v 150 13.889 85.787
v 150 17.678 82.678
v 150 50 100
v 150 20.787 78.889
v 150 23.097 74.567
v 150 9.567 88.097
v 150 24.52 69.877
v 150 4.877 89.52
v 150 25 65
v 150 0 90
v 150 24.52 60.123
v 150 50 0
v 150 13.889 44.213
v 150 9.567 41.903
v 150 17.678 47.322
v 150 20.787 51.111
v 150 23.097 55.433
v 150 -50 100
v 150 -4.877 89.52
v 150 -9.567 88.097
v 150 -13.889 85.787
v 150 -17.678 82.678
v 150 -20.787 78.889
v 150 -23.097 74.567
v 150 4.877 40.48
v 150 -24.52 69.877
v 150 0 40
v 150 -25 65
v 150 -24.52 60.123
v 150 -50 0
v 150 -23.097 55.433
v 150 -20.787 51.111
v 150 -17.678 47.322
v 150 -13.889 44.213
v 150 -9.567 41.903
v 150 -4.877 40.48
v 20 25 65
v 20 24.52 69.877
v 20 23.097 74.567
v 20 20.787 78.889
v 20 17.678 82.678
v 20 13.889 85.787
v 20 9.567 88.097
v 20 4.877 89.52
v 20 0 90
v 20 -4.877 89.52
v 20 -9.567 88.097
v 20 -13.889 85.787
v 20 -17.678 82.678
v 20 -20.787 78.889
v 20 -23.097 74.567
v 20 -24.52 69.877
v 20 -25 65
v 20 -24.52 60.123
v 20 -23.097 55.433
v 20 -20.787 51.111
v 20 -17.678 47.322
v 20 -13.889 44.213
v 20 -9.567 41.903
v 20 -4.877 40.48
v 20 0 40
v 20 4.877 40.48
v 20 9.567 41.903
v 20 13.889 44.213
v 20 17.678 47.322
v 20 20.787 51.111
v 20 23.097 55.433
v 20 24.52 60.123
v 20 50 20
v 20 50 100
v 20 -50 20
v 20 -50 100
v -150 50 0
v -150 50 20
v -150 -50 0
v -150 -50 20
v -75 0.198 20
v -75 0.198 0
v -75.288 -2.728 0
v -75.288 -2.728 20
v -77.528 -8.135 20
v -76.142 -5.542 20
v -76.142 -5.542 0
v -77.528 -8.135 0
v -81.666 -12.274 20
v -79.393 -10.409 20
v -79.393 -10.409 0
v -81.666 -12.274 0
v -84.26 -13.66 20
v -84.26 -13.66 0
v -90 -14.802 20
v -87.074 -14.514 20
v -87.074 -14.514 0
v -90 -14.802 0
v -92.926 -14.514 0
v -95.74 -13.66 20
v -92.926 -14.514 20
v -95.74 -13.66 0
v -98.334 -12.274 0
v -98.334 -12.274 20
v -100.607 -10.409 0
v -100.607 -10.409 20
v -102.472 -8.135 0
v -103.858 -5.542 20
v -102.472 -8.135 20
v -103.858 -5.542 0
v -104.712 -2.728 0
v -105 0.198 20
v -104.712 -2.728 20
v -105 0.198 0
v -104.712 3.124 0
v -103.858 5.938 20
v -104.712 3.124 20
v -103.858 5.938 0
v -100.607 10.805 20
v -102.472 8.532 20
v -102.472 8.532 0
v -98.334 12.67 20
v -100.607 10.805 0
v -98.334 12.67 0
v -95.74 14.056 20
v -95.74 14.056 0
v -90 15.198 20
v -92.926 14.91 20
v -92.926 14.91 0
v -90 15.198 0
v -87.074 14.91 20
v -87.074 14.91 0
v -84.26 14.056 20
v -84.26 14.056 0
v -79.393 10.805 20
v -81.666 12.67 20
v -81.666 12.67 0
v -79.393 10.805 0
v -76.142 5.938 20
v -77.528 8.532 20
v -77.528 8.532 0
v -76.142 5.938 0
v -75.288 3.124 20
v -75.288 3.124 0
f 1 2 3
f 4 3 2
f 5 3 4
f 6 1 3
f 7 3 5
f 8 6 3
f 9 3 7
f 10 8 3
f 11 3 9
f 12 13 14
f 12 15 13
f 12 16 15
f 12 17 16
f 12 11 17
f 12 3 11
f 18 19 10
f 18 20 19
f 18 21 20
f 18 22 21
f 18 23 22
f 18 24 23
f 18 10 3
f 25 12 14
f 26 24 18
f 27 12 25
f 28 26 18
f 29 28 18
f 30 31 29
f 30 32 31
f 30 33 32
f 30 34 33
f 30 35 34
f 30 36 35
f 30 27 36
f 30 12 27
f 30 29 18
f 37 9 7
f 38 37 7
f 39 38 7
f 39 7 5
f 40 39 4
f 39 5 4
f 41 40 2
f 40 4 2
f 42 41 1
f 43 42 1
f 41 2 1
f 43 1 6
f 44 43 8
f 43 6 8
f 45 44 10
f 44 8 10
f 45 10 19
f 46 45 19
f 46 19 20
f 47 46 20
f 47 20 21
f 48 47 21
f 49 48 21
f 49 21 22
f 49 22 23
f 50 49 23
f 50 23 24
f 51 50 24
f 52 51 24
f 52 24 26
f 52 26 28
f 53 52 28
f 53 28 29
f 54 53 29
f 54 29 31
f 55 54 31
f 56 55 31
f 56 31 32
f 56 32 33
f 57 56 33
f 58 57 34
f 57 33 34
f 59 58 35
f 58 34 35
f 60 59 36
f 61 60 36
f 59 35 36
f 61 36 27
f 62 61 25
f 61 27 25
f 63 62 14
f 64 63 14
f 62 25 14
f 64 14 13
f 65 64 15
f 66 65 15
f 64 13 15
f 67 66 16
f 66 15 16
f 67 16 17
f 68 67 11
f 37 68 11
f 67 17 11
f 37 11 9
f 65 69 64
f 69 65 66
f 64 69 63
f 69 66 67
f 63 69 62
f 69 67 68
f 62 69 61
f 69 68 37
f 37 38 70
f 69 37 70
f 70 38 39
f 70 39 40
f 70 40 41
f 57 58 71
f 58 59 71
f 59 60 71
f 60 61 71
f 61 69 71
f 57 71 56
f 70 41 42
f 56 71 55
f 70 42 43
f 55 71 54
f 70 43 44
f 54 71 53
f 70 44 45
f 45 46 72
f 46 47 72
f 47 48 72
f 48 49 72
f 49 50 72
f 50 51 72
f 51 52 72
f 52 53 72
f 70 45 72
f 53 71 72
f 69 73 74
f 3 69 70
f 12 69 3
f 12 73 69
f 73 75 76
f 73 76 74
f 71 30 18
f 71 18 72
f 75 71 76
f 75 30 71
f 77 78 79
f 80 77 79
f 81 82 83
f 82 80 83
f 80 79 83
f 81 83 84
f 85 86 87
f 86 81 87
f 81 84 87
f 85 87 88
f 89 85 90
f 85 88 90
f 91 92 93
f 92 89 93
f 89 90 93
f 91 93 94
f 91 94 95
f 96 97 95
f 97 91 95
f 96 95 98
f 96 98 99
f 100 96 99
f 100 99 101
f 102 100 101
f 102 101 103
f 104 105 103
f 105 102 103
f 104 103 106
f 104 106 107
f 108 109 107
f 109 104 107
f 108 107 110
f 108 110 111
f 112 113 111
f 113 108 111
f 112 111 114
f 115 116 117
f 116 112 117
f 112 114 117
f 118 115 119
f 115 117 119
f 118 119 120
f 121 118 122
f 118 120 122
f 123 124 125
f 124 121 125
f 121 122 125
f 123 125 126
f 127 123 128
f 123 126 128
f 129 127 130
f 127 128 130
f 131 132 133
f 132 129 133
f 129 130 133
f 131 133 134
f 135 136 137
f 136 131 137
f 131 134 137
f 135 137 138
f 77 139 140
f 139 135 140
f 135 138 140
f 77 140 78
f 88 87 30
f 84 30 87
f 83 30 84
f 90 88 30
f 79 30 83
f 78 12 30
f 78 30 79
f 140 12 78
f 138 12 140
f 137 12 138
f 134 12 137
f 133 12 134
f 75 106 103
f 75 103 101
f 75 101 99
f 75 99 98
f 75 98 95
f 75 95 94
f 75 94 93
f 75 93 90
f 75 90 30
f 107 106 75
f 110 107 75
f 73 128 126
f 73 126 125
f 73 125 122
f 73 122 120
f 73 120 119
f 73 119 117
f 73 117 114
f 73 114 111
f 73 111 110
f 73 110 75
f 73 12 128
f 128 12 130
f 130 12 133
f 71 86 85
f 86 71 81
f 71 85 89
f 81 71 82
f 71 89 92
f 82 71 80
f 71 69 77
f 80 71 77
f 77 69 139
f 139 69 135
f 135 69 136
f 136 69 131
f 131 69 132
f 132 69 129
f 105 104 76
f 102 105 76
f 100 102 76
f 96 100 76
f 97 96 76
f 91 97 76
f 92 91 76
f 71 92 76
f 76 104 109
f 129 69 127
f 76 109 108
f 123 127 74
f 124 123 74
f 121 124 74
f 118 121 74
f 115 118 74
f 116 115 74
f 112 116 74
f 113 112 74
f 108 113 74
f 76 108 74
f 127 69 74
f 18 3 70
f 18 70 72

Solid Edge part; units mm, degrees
sketch "Sketch1" plane through (0, 0, 0) normal (0, 0, 1) x (1, 0, 0)
  circle A0 centre (-90, 0.1981) radius 15
  line L0 (-150, 50) -> (150, 50)
  line L1 (150, 50) -> (150, -50)
  line L2 (150, -50) -> (-150, -50)
  line L3 (-150, -50) -> (-150, 50)
  dimension "D1" = 100
  dimension "D2" = 300
  dimension "D3" = 60
extrude "Protrusion1" add sketch "Sketch1" along normal blind 20
sketch "Sketch2" plane through (150, 0, 10) normal (1, 0, 0) x (0, 1, 0)
  circle A0 centre (0, 55) radius 25
  line L0 (-50, 10) -> (50, 10)
  line L1 (50, 10) -> (50, 90)
  line L2 (50, 90) -> (-50, 90)
  line L3 (-50, 90) -> (-50, 10)
  dimension "D1" = 80
  dimension "D2" = 35
  dimension "D3" = 50
extrude "ExtrudedProtrusion_2" add sketch "Sketch2" against normal blind 130
